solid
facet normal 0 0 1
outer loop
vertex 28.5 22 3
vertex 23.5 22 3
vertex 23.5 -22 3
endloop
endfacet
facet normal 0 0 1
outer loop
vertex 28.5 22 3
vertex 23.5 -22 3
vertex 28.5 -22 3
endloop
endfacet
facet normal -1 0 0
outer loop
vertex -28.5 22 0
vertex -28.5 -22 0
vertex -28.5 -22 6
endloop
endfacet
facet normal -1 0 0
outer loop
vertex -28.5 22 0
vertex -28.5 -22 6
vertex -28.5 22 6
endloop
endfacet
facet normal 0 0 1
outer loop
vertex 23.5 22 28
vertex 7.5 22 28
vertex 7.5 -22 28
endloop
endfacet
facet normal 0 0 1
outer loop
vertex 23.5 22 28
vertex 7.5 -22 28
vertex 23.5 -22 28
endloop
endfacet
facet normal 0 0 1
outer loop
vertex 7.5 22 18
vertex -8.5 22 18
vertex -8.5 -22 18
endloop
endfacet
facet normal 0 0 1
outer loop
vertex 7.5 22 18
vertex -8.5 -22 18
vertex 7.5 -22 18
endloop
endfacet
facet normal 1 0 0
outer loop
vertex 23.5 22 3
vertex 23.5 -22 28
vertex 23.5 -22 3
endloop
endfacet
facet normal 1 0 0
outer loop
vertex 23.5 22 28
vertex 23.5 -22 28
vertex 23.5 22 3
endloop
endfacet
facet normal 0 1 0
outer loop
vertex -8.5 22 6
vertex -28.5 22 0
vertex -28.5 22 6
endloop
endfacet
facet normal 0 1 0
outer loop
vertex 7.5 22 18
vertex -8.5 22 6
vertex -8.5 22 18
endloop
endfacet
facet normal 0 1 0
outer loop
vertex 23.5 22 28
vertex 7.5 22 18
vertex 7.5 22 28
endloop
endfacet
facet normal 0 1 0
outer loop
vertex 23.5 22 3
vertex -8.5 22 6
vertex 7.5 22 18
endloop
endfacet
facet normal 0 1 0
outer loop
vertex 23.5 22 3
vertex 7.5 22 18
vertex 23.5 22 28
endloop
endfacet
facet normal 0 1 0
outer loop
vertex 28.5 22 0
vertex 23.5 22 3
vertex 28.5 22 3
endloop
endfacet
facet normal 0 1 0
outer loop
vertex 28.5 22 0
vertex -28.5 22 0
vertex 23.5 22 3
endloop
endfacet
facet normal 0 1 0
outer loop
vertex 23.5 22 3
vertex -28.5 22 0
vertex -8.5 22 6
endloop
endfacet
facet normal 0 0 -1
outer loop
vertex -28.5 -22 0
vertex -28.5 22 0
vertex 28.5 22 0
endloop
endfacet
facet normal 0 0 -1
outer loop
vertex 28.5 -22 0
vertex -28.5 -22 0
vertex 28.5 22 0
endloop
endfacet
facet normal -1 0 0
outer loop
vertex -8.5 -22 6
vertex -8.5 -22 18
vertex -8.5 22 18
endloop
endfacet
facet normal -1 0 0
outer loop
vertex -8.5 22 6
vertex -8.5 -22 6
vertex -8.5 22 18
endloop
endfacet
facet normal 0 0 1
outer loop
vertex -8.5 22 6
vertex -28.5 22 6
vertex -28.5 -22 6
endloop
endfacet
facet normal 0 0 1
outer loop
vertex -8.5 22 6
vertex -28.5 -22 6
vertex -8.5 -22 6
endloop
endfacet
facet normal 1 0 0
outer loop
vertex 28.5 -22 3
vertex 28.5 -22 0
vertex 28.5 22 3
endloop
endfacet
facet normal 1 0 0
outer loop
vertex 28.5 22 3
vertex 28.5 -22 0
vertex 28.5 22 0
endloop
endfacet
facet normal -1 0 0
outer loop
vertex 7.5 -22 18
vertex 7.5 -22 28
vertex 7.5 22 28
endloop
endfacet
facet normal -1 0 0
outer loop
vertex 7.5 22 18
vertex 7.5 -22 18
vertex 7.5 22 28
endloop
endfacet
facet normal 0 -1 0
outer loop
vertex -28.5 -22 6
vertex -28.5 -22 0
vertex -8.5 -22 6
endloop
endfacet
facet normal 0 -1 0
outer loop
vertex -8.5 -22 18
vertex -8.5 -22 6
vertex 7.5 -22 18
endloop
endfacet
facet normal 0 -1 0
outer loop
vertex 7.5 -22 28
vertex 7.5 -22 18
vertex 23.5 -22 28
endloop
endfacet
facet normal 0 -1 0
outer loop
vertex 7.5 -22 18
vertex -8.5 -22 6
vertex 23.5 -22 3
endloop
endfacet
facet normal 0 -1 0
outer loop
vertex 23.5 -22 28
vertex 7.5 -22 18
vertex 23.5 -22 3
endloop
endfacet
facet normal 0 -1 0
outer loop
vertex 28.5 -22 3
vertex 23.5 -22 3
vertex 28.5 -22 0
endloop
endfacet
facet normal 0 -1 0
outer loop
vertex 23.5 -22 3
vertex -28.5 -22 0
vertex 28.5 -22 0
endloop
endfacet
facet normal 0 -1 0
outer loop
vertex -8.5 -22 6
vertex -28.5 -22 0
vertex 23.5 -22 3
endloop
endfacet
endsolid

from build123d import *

# Parameters (mm, degrees)
F0_W     = 57
F0_H     = 44
F1_DEPTH = 28
F2_W     = 20
F2_H     = 44
F3_DEPTH = 22
F4_W     = 16
F4_H     = 44
F5_DEPTH = 10
F6_W     = 5
F6_H     = 44
F7_DEPTH = 25


with BuildPart() as f1:
    # F0 (on Top) → F1 (new body)
    with BuildSketch(Plane.XY):
        Rectangle(F0_W, F0_H)
    extrude(amount=F1_DEPTH)

    # F2 (on face) → F3 (cut)
    with BuildSketch(Plane.XY.offset(28)):
        with Locations((-18.5, 0)):
            Rectangle(F2_W, F2_H)
    extrude(amount=-F3_DEPTH, mode=Mode.SUBTRACT)

    # F4 (on face) → F5 (cut)
    with BuildSketch(Plane.XY.offset(28)):
        with Locations((-0.5, 0)):
            Rectangle(F4_W, F4_H)
    extrude(amount=-F5_DEPTH, mode=Mode.SUBTRACT)

    # F6 (on face) → F7 (cut)
    with BuildSketch(Plane.XY.offset(28)):
        with Locations((26, 0)):
            Rectangle(F6_W, F6_H)
    extrude(amount=-F7_DEPTH, mode=Mode.SUBTRACT)


solid = f1.part
